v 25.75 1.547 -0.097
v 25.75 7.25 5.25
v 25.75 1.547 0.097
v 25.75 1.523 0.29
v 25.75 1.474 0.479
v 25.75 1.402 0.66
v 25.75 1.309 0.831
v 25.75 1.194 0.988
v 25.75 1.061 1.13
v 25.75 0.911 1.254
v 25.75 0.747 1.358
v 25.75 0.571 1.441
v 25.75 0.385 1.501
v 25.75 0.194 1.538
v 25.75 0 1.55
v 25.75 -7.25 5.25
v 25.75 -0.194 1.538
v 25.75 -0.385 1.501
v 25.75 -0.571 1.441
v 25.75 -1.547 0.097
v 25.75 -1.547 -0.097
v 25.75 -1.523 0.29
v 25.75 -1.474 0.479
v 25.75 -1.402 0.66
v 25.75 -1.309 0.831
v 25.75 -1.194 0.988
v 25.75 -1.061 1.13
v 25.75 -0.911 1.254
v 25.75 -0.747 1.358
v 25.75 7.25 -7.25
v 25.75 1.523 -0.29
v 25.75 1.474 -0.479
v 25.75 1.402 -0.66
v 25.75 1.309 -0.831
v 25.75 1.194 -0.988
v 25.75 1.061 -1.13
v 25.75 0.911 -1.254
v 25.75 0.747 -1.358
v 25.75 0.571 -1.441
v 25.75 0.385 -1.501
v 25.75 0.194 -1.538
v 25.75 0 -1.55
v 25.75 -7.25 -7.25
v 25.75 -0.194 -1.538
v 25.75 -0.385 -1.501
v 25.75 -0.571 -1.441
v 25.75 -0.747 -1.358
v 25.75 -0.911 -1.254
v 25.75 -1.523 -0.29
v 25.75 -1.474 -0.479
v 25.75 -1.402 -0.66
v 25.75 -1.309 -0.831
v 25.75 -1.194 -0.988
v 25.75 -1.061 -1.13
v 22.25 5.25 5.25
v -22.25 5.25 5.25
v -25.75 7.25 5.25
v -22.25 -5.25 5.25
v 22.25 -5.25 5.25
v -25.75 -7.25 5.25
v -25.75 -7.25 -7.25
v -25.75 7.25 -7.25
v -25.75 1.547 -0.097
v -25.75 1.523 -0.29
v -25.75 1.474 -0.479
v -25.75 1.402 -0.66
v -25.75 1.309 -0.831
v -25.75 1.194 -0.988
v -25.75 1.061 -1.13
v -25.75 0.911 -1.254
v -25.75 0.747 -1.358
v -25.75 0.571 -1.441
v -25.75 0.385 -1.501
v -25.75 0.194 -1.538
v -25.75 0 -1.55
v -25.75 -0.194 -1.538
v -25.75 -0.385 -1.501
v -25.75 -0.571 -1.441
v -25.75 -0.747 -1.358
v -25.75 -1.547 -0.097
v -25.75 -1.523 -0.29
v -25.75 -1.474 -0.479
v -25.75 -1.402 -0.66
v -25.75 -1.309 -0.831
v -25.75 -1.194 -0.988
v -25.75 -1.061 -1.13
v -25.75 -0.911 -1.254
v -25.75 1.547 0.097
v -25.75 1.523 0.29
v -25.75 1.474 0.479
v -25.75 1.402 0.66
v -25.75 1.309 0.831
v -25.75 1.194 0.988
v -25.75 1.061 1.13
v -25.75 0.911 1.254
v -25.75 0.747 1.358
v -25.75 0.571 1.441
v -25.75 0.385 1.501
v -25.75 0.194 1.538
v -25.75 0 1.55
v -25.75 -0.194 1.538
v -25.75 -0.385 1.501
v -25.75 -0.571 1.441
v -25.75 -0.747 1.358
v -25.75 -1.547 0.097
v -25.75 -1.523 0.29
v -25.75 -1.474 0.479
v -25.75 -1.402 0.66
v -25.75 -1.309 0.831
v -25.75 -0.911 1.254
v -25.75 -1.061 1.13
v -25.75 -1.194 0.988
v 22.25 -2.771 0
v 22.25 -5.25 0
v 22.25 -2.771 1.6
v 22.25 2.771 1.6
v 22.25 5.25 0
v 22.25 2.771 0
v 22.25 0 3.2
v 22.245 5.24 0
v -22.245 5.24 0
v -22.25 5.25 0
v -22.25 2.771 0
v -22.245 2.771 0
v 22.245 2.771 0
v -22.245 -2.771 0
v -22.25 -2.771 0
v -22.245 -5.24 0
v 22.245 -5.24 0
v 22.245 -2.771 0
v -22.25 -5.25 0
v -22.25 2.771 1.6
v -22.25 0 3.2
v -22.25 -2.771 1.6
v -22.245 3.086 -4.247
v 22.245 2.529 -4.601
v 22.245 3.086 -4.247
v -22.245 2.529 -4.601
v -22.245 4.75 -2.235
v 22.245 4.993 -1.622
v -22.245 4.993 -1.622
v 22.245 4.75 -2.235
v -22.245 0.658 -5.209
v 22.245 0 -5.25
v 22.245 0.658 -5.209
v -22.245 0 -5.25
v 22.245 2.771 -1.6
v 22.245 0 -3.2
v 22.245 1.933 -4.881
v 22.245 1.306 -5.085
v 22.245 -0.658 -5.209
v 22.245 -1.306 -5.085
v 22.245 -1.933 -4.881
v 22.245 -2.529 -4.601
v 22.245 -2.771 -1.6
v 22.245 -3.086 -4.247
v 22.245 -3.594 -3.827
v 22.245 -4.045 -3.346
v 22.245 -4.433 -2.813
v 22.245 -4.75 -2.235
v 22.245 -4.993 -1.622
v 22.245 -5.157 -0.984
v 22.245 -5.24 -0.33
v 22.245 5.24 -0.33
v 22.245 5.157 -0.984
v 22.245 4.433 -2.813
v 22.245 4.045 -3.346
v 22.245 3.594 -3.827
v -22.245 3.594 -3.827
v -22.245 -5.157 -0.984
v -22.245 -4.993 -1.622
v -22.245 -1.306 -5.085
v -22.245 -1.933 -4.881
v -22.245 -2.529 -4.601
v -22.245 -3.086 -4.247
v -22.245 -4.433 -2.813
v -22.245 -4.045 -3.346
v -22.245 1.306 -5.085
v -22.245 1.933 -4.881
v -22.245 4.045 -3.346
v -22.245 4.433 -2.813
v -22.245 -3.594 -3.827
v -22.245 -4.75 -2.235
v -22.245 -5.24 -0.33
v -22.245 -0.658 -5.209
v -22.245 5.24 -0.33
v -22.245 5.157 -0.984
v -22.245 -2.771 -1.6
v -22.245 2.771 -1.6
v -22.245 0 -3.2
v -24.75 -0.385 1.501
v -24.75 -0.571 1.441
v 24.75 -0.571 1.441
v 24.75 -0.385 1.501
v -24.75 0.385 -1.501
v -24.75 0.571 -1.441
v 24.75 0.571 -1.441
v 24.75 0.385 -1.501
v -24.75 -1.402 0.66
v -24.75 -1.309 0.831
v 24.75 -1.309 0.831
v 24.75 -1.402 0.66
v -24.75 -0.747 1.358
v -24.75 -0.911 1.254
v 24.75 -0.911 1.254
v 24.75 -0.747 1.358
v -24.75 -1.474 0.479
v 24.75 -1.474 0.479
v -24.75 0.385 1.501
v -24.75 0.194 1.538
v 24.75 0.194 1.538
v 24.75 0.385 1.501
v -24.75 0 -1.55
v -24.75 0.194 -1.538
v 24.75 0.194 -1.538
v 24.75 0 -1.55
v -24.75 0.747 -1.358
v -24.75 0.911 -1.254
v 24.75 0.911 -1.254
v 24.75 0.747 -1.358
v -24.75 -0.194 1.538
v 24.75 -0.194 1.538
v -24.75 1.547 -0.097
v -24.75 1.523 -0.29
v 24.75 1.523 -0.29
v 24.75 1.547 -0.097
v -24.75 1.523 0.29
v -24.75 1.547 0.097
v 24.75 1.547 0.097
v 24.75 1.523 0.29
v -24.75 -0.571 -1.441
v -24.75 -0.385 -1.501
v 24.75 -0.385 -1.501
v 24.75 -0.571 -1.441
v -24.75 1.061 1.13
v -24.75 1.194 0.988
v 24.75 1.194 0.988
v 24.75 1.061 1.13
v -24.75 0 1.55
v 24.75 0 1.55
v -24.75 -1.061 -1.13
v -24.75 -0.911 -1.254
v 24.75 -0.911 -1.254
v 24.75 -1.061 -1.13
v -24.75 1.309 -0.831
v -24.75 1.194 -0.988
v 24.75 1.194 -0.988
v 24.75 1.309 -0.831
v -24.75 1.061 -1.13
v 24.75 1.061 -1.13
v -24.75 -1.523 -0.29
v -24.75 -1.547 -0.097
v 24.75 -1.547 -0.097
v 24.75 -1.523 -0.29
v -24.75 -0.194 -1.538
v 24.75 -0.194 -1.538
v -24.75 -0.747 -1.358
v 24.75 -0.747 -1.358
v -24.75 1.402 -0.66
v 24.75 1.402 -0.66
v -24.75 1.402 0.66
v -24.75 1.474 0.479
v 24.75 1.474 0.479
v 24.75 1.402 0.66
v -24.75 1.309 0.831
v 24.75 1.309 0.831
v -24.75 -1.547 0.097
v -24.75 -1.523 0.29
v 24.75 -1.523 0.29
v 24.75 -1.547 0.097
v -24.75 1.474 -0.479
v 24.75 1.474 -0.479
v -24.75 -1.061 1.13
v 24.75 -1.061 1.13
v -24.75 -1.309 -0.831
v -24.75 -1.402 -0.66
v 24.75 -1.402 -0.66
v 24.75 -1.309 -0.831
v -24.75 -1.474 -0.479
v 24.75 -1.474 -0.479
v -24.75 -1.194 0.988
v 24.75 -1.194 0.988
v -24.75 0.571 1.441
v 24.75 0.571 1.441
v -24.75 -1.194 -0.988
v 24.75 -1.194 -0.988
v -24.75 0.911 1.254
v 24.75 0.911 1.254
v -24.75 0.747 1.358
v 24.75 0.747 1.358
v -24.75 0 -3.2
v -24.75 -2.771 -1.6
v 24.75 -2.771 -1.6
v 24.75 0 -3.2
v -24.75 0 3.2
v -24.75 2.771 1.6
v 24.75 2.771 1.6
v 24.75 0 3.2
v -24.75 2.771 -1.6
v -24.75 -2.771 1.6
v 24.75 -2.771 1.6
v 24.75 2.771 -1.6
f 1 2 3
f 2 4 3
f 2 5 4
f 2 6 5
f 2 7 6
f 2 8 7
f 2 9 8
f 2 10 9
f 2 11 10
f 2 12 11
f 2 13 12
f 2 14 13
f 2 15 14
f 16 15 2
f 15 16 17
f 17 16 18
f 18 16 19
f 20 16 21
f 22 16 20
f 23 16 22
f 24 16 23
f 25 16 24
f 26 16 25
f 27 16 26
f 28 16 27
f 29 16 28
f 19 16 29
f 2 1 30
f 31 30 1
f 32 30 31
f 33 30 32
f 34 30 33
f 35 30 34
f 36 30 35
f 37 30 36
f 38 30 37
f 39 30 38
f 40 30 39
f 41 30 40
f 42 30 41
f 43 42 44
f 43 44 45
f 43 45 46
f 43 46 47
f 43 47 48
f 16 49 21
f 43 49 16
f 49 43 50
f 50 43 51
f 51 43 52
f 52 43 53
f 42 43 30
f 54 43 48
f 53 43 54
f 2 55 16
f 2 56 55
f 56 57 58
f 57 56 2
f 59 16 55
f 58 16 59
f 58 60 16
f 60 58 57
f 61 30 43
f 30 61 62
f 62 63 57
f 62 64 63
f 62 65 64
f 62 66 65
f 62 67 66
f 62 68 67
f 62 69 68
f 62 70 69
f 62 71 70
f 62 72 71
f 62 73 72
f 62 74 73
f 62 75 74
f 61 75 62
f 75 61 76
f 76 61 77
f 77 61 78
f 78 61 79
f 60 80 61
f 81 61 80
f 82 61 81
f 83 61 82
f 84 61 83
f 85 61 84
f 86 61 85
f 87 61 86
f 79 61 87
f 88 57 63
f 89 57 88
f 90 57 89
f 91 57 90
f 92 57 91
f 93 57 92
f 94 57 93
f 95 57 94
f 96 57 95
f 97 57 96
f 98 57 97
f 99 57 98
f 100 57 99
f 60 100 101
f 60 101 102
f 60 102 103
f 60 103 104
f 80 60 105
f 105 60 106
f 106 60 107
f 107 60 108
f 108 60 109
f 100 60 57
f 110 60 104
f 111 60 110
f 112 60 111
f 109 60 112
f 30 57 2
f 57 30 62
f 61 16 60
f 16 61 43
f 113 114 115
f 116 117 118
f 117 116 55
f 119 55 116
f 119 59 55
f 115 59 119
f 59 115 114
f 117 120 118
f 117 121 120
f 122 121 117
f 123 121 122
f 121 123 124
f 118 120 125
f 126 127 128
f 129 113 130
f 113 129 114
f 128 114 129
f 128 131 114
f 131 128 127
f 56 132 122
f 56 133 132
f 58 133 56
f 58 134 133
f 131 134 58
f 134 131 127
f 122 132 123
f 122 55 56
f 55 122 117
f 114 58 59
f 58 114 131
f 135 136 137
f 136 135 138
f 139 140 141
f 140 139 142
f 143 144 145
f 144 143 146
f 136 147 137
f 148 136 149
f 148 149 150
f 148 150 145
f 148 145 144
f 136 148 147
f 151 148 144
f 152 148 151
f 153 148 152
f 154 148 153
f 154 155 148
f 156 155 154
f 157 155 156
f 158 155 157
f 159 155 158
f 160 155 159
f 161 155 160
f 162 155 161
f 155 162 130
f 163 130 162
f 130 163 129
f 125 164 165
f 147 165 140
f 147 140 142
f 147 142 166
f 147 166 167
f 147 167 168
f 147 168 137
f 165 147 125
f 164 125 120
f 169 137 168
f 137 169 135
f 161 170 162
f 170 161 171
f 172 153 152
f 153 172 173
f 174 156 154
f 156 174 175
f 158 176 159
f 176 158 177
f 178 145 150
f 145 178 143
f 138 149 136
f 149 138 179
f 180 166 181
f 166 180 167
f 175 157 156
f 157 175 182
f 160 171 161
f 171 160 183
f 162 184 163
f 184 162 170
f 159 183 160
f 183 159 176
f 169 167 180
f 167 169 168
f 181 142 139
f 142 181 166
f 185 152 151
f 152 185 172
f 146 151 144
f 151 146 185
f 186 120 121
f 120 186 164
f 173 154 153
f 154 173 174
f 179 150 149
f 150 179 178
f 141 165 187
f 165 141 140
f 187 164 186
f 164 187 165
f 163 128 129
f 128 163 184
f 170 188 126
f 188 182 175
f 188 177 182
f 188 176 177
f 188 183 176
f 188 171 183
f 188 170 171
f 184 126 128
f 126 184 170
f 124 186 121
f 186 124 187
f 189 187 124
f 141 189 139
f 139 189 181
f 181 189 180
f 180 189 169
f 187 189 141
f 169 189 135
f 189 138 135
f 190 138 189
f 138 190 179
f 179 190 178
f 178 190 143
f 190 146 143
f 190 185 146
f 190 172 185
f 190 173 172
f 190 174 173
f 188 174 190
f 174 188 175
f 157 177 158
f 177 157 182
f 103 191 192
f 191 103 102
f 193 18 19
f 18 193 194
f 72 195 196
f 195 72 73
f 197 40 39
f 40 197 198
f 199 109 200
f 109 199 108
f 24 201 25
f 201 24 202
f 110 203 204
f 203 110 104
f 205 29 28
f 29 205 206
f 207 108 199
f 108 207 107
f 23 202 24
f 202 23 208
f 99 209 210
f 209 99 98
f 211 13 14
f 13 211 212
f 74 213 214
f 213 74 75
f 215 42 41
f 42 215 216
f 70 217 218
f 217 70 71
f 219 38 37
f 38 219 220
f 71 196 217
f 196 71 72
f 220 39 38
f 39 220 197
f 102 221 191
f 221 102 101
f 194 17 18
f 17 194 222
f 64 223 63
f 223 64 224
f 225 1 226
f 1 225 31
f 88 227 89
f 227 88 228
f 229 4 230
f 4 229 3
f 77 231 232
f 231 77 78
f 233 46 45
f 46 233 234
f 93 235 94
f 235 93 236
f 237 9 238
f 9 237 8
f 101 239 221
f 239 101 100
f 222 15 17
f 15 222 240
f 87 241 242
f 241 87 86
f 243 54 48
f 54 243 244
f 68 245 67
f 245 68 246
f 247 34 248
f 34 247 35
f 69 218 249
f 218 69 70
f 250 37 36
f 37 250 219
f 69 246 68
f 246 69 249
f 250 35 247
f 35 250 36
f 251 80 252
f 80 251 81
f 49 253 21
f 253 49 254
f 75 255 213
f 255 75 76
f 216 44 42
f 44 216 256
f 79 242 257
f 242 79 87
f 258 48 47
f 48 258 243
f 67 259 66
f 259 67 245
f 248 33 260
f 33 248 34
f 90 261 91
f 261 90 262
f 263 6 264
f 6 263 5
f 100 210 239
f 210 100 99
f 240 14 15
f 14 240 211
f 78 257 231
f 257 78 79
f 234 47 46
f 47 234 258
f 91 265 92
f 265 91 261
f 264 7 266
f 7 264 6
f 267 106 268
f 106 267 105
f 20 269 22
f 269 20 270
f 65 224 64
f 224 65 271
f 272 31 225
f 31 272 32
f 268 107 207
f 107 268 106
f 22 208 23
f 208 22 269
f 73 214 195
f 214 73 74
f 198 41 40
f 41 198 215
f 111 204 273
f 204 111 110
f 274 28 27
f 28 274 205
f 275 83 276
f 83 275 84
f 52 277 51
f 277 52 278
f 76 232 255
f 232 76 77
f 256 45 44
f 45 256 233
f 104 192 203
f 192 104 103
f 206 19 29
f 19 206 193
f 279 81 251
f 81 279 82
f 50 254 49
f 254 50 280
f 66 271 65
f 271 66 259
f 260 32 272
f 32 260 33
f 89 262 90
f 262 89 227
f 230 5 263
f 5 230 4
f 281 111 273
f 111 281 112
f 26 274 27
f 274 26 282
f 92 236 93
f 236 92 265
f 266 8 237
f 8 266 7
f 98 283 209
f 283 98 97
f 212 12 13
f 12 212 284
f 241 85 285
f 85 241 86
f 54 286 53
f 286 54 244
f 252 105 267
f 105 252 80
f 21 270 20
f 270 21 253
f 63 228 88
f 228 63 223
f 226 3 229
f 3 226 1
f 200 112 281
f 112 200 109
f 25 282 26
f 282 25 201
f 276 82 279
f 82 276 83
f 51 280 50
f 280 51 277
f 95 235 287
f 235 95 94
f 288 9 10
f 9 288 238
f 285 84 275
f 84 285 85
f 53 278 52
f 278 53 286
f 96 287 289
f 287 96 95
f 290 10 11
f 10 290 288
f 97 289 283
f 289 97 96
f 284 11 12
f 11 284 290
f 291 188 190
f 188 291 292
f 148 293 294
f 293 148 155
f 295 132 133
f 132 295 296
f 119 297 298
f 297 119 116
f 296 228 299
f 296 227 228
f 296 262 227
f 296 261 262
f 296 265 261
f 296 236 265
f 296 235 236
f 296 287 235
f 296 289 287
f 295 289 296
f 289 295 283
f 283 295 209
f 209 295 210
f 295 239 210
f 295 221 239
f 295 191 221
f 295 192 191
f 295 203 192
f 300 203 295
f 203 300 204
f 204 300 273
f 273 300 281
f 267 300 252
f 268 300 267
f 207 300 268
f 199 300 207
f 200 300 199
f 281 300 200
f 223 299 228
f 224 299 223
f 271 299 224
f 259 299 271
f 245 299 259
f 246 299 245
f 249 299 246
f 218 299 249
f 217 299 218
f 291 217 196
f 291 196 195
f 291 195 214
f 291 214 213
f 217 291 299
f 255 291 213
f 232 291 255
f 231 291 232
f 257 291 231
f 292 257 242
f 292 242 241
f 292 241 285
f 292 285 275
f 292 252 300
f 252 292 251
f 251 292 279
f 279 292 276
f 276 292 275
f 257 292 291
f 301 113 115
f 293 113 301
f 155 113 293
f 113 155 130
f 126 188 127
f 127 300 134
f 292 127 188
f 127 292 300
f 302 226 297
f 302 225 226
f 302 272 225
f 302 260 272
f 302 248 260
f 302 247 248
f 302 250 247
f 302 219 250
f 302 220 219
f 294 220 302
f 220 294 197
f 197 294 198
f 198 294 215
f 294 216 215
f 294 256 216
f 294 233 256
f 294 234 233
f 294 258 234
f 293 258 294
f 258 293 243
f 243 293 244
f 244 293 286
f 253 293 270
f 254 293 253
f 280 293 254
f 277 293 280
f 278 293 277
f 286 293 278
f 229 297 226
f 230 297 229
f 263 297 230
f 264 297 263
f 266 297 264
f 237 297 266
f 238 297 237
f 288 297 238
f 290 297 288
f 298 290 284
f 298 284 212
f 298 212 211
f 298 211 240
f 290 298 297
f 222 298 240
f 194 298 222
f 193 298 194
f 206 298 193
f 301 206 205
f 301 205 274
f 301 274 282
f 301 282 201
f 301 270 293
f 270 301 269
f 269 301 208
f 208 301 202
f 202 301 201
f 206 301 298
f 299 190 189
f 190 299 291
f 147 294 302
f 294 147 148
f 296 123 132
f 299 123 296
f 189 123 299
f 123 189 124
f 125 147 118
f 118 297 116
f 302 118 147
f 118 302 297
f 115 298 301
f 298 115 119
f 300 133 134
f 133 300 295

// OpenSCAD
/***************************************************************
 Battery compartment with electrical connections
  (c) 2010 Juan Gonzalez-Gomez (Obijuan) juan@iearobotics.com
   This design is derived from the Battery comparment generator
   (c) Nikolaus Gradwohl (guru (at) local-guru.net)
    http://www.thingiverse.com/thing:5051
 -----------------------------------------------------------
 In this preliminary version, only 1 AAA battery is used for
 testing pourposes.
  Two nuts are embedded into the batettery compartment. Two 
screws are inserted from the outside and touch the battery
-----------------------------------------------------------
GPL LICENCE
****************************************************************/

//-- Battery sizes. In this design only AAA bateries are used

AA = [ 14.5, 50.5 ];
AAA = [ 10.5,44.5 ];
C = [ 26.2, 50 ];
D = [ 34.2, 61.5 ]; 

// CHOOSE BATTERY TYPE AND COUNT 
typ = AAA;
num =1;

//-- Nut parameters
nut_h = 2.5;
nut_radius = 6.4/2;
nut_drill = 3.1;

//-- Battery dimensions: width, height and length

w=typ[0];
h=w;
l=typ[1];

//-- Battery compartment thickness

bottom_thick=2;
fr_thick=3.5;    //-- Front and rear parts
side_thick=2;    //-- Side part


//-- Build the thing!
difference() {

 //-- The mother cube
 translate([0,0,-bottom_thick/2])
  cube(size=[l+2*fr_thick,w+2*side_thick,h+bottom_thick],center=true);

  //-- Remove half-top-interior part
   translate([0,0,h/2])
     cube(size=[l,w,h],center=true);

  //-- Create the room for the battery
   rotate([0,90,0])
    cylinder(r=w/2, h=l-0.01, center=true, $fn=50); 

   //-- Create the nut drills
   rotate([0,90,0])
   cylinder(center=true,h=l+20, r=nut_drill/2, $fn=50, center=true);

   //-- Create the room for embbeding the nuts
   rotate([0,90,0]) 
    cylinder(h=l+2*nut_h, r=nut_radius, $fn=6, center=true);

}

//-- Just for testing pourposes
* rotate([0,90,0])
    cylinder(r=w/2, h=l-0.01, center=true, $fn=50); 
